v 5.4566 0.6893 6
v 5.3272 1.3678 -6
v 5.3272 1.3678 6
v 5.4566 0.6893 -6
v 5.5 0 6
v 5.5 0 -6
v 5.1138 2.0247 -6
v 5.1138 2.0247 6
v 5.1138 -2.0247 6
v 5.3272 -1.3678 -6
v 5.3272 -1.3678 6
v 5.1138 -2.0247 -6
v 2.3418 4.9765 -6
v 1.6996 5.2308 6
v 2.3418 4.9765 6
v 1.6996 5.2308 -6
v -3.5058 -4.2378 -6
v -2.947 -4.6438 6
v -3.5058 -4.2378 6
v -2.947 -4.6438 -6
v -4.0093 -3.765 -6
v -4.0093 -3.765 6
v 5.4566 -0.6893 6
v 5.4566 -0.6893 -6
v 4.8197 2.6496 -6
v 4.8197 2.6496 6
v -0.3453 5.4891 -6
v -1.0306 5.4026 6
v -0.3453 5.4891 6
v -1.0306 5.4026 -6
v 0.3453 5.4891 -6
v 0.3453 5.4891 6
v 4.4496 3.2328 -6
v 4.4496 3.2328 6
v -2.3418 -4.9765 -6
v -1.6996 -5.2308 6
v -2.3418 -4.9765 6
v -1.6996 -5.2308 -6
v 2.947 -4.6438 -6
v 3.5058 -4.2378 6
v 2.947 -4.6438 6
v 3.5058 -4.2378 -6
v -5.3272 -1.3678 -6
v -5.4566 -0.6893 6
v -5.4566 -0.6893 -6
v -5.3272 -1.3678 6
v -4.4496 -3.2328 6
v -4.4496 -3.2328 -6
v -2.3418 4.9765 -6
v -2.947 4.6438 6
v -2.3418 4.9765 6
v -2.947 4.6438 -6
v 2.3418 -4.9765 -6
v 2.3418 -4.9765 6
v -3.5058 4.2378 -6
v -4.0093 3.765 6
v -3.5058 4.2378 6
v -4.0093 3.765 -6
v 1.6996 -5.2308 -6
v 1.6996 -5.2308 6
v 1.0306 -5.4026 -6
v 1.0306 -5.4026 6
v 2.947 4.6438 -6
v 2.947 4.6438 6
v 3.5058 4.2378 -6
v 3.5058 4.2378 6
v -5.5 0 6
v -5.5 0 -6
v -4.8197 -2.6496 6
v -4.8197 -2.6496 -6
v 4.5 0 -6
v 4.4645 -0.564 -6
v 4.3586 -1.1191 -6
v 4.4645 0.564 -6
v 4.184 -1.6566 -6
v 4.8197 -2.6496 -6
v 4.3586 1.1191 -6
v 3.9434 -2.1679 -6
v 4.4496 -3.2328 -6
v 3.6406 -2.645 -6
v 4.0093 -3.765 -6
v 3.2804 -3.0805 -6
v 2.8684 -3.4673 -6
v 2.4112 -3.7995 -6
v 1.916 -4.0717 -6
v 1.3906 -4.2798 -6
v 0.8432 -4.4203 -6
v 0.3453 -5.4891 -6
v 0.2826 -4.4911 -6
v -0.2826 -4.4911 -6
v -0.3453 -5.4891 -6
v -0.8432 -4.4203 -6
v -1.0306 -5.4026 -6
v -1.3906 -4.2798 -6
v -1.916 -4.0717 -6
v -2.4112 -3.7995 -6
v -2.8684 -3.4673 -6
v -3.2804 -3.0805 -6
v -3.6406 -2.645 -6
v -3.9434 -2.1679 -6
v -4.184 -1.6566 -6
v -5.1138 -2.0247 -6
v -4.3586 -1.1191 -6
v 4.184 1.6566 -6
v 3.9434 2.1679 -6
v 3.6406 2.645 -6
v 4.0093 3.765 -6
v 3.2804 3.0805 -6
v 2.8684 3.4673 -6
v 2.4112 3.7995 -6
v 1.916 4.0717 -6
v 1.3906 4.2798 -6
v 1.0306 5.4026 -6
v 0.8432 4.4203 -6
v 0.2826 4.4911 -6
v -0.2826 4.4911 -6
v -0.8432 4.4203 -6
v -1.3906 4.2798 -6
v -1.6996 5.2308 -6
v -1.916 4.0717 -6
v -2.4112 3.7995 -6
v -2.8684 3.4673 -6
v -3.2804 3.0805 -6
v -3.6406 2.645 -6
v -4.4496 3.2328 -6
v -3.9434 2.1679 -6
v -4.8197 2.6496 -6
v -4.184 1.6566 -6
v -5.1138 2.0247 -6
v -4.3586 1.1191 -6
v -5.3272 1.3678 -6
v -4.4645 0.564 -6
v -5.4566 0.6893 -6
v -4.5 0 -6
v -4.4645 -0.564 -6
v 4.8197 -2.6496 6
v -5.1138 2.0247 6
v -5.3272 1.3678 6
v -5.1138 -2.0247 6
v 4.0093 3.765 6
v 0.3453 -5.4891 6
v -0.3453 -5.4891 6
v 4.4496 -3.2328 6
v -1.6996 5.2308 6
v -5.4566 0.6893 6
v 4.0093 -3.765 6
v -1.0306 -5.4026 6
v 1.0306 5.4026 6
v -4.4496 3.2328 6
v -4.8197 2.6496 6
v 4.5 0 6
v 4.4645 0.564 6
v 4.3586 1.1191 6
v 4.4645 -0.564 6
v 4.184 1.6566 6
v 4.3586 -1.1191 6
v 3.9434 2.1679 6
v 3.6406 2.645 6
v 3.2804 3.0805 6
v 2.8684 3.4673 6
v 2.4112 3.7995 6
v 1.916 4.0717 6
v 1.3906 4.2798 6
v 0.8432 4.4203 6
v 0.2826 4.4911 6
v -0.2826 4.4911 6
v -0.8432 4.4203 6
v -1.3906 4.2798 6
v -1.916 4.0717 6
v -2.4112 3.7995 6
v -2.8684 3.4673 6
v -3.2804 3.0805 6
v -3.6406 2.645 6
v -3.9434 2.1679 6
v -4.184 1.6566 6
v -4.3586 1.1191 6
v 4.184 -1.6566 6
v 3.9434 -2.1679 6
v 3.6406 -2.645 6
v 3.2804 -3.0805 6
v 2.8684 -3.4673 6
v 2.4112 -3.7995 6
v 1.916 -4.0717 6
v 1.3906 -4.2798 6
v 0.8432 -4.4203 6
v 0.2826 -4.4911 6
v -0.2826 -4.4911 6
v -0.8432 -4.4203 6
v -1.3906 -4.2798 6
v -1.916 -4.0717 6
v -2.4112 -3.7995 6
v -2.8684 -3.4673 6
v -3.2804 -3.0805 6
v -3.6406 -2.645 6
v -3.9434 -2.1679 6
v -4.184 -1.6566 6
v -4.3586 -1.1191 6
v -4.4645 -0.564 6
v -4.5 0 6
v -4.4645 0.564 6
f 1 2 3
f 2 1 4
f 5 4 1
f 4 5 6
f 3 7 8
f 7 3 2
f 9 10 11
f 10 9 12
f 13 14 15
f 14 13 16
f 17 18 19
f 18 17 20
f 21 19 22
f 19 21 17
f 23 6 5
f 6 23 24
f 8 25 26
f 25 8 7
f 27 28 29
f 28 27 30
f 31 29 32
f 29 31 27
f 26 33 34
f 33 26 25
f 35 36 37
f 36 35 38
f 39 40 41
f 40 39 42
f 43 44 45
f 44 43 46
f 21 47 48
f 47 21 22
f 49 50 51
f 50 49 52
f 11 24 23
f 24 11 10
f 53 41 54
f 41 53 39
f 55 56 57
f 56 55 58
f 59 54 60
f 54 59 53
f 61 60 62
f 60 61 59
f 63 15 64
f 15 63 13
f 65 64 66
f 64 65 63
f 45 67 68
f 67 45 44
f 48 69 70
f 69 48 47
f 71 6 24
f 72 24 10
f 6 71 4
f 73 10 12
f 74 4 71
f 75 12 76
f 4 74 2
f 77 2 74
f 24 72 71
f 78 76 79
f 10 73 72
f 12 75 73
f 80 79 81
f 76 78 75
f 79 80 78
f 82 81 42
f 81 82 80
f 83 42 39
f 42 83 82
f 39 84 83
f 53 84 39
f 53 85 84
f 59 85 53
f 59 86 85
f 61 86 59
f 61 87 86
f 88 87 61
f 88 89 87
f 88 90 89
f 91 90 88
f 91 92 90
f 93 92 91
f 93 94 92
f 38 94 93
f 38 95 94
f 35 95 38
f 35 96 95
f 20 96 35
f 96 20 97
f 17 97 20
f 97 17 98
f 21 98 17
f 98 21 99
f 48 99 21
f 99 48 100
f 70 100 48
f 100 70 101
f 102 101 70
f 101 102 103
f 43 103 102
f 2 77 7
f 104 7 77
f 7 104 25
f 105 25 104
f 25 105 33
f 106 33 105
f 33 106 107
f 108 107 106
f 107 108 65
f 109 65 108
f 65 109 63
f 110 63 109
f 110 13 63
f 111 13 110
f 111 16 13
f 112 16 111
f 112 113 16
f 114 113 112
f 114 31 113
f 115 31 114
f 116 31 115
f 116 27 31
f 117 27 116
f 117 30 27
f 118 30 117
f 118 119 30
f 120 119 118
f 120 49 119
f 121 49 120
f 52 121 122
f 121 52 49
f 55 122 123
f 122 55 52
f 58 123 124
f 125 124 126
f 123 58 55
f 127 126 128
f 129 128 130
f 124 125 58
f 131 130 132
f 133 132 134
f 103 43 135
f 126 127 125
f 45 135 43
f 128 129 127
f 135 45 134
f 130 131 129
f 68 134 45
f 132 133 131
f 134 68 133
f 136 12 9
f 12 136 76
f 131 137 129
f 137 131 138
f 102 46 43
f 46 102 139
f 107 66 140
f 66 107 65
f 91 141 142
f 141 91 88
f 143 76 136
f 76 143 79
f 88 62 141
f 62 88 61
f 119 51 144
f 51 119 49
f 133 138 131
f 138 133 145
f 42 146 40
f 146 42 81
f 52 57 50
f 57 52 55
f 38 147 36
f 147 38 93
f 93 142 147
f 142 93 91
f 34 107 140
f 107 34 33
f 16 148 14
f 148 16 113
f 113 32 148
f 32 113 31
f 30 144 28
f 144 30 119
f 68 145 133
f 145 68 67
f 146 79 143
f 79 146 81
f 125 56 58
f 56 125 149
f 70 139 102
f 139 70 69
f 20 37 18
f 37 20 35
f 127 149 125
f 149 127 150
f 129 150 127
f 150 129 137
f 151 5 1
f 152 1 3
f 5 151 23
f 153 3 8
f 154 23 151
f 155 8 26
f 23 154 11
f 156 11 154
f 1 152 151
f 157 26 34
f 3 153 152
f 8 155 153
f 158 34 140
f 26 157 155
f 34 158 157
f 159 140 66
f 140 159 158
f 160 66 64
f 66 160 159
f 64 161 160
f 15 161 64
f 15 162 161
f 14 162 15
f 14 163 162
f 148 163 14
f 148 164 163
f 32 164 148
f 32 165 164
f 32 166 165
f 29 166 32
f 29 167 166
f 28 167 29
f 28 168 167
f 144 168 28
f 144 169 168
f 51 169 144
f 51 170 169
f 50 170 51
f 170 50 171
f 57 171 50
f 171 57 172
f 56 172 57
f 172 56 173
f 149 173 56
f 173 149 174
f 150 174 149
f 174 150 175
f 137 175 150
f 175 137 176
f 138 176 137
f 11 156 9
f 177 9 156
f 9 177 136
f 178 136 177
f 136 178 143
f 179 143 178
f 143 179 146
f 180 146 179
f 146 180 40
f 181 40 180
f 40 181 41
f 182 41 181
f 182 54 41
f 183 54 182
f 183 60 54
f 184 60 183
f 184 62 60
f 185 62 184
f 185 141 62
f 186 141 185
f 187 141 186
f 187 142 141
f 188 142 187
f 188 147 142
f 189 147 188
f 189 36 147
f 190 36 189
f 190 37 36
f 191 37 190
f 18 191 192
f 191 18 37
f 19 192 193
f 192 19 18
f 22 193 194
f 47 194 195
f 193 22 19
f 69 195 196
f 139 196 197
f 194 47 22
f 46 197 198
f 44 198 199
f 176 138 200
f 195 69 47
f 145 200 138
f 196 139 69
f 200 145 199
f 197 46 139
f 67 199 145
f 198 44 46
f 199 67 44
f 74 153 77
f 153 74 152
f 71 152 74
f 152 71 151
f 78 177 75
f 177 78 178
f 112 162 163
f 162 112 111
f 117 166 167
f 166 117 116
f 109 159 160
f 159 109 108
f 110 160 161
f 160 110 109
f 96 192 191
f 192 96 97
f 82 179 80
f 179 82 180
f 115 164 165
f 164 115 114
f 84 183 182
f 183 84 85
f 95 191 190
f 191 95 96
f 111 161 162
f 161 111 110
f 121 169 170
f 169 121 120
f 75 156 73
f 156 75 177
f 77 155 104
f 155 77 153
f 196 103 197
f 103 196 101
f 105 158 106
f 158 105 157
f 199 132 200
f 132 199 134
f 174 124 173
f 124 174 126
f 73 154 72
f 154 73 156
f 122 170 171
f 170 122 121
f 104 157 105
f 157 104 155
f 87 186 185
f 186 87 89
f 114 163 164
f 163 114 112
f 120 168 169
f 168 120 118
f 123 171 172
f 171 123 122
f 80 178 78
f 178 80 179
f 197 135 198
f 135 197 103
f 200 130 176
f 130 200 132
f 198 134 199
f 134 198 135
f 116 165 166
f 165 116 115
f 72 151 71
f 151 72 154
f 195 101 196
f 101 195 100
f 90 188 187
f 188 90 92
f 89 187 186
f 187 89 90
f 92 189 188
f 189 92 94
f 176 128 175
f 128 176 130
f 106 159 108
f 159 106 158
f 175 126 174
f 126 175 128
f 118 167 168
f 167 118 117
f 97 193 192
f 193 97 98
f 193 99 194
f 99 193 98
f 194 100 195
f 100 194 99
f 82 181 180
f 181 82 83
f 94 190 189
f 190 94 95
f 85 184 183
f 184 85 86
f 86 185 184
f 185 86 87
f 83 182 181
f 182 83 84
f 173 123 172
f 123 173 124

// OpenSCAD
$fn = 50;


difference() {
	union() {
		translate(v = [0, 0, -6.0000000000]) {
			cylinder(h = 12, r = 5.5000000000);
		}
	}
	union() {
		translate(v = [0, 0, -100.0000000000]) {
			cylinder(h = 200, r = 4.5000000000);
		}
	}
}
